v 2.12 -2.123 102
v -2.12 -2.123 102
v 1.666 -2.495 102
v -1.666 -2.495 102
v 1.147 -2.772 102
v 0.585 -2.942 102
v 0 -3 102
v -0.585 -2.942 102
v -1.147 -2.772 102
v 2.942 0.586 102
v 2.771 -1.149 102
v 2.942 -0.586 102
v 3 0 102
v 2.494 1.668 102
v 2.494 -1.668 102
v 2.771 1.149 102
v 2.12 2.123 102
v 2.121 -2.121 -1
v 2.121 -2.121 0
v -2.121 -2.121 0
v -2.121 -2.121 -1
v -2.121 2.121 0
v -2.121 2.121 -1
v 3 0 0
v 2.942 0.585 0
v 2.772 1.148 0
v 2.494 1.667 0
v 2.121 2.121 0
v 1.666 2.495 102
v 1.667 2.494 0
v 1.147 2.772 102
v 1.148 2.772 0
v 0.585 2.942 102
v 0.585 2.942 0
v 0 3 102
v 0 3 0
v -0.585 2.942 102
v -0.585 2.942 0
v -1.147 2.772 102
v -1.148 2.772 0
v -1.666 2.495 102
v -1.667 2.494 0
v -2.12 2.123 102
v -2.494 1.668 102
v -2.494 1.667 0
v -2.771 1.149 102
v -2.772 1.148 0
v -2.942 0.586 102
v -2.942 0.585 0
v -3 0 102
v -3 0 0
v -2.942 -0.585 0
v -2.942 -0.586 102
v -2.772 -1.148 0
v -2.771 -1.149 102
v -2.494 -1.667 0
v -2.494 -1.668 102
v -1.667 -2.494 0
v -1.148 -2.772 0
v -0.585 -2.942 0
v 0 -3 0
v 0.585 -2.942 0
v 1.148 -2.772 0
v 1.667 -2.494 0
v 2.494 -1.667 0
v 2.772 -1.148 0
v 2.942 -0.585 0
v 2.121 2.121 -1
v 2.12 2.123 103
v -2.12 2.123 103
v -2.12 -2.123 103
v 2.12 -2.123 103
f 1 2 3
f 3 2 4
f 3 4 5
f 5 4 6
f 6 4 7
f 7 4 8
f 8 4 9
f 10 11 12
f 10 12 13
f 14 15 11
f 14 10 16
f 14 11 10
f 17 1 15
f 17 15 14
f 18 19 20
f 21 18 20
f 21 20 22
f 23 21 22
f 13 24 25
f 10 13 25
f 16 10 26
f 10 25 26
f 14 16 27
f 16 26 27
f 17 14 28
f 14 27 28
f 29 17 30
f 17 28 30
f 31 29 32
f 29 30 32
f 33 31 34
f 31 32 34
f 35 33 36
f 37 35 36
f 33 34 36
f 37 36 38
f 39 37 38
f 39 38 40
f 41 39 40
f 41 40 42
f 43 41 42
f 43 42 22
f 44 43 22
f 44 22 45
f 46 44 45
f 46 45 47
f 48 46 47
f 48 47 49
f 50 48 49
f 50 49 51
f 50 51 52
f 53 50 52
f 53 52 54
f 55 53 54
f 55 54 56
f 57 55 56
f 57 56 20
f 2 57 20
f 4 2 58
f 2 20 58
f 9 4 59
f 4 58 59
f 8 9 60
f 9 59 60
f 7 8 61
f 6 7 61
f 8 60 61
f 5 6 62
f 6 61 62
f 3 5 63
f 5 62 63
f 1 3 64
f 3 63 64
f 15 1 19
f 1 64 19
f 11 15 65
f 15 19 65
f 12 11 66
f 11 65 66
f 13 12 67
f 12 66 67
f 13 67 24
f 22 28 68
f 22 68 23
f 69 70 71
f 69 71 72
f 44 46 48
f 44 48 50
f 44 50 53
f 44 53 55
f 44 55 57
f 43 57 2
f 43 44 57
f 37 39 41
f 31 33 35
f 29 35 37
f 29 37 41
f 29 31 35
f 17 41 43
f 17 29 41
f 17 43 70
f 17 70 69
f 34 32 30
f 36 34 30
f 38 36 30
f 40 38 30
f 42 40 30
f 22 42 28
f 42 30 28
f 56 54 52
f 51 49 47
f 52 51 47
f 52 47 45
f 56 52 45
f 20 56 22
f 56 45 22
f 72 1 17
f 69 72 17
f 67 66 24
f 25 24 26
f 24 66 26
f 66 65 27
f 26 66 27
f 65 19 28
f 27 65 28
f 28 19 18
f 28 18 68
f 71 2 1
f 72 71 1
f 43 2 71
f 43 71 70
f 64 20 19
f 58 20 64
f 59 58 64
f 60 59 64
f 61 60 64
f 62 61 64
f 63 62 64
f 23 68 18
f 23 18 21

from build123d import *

# Parameters (mm, degrees)
MAIN_BAR_CROSS_SECTION_R = 3
BOSS_EXTRUDE1_DEPTH      = 102
SKETCH2_W                = 4.242640688
SKETCH2_H                = 4.242640688
BOSS_EXTRUDE2_DEPTH      = 1
SKETCH3_W                = 4.24
SKETCH3_H                = 4.245279732
BOSS_EXTRUDE3_DEPTH      = 1


with BuildPart() as part:
    # Main bar cross section → Boss-Extrude1 (new body)
    with BuildSketch(Plane.XY):
        Circle(MAIN_BAR_CROSS_SECTION_R)
    extrude(amount=BOSS_EXTRUDE1_DEPTH)

    # Sketch2 → Boss-Extrude2 (add)
    with BuildSketch(Plane(origin=(0, 0, 0), x_dir=(-1, 0, 0), z_dir=(0, 0, -1))):
        Rectangle(SKETCH2_W, SKETCH2_H)
    extrude(amount=BOSS_EXTRUDE2_DEPTH)

    # Sketch3 → Boss-Extrude3 (add)
    with BuildSketch(Plane.XY.offset(102)):
        Rectangle(SKETCH3_W, SKETCH3_H)
    extrude(amount=BOSS_EXTRUDE3_DEPTH)


solid = part.part
